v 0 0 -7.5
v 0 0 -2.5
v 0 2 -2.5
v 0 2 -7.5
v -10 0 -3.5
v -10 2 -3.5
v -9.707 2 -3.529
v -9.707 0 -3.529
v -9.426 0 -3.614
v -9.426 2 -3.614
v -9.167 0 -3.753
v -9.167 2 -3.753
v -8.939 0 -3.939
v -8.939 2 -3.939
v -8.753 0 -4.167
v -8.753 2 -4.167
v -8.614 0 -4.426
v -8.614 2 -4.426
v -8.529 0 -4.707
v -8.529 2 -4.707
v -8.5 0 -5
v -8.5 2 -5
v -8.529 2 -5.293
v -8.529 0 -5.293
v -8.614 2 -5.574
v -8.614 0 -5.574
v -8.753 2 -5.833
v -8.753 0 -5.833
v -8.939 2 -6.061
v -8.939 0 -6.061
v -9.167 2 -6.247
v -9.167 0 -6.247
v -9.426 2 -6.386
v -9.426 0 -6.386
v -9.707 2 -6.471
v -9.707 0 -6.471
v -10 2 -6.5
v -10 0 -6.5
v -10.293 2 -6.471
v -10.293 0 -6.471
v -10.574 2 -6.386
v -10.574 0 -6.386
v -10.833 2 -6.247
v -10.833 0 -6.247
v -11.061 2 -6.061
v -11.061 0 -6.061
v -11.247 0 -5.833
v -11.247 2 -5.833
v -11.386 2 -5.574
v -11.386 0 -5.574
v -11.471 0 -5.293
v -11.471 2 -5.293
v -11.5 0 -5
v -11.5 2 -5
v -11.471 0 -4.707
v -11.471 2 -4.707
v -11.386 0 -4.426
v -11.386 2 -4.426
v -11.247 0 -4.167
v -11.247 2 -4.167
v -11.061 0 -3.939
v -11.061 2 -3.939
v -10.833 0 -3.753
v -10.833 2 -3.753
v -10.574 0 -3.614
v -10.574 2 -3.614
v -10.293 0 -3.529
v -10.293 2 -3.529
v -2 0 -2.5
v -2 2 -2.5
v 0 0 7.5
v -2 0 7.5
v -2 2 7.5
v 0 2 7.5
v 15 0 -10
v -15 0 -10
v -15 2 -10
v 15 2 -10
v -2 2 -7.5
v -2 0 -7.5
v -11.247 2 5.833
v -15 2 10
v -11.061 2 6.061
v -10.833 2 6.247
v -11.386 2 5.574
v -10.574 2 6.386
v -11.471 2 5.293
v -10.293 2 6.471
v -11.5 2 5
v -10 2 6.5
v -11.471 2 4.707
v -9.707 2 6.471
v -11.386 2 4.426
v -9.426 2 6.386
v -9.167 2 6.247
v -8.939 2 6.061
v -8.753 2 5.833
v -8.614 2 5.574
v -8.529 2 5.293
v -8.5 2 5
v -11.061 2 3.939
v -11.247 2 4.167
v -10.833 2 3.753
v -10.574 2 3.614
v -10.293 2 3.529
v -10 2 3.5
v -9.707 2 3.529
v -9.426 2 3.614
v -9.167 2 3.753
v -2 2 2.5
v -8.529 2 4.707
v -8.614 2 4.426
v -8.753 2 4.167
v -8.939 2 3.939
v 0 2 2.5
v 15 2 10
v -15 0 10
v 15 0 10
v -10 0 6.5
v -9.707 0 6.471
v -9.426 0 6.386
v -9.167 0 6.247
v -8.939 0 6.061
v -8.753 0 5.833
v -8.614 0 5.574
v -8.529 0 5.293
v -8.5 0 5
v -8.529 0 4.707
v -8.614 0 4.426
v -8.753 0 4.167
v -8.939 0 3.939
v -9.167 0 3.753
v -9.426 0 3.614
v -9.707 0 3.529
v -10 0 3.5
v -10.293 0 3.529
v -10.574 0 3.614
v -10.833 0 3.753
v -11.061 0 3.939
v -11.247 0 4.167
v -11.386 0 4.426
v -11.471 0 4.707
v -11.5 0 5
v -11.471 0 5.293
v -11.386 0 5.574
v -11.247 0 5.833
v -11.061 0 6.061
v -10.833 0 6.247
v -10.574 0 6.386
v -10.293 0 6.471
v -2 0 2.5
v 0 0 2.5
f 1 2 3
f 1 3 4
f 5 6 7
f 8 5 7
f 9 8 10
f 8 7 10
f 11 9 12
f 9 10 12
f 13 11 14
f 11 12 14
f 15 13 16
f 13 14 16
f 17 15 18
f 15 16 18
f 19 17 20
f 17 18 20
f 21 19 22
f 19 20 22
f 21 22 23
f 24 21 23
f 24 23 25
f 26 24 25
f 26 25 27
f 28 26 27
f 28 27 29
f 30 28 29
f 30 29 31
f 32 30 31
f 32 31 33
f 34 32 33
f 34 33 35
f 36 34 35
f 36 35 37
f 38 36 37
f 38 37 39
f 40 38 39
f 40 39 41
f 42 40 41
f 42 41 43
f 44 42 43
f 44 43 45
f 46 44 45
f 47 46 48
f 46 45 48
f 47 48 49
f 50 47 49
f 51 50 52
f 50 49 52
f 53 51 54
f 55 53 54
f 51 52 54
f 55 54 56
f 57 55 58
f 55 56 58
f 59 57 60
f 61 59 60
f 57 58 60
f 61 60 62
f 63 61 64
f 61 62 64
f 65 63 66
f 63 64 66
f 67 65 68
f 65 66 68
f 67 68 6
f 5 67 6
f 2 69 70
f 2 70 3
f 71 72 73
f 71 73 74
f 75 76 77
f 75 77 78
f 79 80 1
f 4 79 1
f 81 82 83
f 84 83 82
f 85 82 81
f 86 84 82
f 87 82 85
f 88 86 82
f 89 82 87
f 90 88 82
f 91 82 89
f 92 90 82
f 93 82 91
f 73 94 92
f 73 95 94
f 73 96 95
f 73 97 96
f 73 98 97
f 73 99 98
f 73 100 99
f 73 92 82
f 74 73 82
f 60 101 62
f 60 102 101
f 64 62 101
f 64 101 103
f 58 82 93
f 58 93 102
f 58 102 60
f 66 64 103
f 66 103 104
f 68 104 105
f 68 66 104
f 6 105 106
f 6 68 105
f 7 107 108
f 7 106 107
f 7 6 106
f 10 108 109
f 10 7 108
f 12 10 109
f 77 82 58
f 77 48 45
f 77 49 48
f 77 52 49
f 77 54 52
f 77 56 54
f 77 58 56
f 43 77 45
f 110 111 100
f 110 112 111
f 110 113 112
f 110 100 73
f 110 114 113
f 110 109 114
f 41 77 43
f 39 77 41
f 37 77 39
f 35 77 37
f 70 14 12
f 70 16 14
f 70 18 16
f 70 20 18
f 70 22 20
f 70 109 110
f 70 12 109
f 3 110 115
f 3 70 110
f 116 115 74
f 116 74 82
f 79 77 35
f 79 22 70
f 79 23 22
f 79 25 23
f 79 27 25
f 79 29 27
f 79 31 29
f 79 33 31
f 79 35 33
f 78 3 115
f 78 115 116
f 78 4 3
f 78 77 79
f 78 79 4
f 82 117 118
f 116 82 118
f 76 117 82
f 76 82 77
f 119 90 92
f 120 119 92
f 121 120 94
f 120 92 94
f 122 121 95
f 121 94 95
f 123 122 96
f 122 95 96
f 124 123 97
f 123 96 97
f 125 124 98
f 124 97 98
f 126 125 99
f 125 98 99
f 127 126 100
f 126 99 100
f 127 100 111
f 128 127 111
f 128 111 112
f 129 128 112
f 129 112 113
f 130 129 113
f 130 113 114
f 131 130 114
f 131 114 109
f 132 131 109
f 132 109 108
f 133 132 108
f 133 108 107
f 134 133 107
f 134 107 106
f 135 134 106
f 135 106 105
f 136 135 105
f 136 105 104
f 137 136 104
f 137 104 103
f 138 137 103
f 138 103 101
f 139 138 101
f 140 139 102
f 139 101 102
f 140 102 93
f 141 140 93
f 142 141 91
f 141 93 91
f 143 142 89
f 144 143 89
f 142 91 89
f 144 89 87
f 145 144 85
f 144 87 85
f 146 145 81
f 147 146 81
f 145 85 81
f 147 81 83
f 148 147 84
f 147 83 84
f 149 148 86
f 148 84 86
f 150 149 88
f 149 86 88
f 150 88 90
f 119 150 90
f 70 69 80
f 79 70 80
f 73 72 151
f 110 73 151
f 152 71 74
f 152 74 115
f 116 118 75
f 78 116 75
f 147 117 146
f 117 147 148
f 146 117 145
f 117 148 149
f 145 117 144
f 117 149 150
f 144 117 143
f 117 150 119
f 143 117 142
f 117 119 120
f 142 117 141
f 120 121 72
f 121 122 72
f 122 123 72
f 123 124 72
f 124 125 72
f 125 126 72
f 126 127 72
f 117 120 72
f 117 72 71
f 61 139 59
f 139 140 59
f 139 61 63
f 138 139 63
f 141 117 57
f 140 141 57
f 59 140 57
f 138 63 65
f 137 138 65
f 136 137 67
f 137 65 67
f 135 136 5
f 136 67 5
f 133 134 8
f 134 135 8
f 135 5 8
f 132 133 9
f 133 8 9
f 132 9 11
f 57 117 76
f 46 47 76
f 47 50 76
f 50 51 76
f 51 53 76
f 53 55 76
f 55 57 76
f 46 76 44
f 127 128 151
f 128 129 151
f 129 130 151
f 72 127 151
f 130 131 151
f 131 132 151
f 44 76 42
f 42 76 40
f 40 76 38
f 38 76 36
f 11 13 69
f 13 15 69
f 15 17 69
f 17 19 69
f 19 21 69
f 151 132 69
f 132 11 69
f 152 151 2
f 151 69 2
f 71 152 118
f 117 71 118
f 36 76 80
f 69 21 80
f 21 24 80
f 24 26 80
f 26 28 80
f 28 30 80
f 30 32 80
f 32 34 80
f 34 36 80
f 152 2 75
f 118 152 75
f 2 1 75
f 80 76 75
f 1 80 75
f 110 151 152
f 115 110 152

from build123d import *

# Parameters (mm, degrees)
SKETCH1_W           = 30
SKETCH1_H           = 20
SKETCH1_W_2         = 2
SKETCH1_H_2         = 5
BOSS_EXTRUDE1_DEPTH = 2
SKETCH2_R           = 1.5
CUT_EXTRUDE1_DEPTH  = 10


with BuildPart() as part:
    # Sketch1 → Boss-Extrude1 (new body)
    with BuildSketch(Plane(origin=(0, 0, 0), x_dir=(1, 0, 0), z_dir=(0, 1, 0))):
        Rectangle(SKETCH1_W, SKETCH1_H)
        with Locations((-1, 5)):
            Rectangle(SKETCH1_W_2, SKETCH1_H_2, mode=Mode.SUBTRACT)
        with Locations((-1, -5)):
            Rectangle(SKETCH1_W_2, SKETCH1_H_2, mode=Mode.SUBTRACT)
    extrude(amount=BOSS_EXTRUDE1_DEPTH)

    # Sketch2 → Cut-Extrude1 (cut)
    with BuildSketch(Plane(origin=(0, 2, 0), x_dir=(1, 0, 0), z_dir=(0, 1, 0))):
        with Locations(Location((-10, 5, 0), (0, 0, 270))):
            Circle(SKETCH2_R)
        with Locations(Location((-10, -5, 0), (0, 0, 270))):
            Circle(SKETCH2_R)
    extrude(amount=-CUT_EXTRUDE1_DEPTH, mode=Mode.SUBTRACT)


solid = part.part
